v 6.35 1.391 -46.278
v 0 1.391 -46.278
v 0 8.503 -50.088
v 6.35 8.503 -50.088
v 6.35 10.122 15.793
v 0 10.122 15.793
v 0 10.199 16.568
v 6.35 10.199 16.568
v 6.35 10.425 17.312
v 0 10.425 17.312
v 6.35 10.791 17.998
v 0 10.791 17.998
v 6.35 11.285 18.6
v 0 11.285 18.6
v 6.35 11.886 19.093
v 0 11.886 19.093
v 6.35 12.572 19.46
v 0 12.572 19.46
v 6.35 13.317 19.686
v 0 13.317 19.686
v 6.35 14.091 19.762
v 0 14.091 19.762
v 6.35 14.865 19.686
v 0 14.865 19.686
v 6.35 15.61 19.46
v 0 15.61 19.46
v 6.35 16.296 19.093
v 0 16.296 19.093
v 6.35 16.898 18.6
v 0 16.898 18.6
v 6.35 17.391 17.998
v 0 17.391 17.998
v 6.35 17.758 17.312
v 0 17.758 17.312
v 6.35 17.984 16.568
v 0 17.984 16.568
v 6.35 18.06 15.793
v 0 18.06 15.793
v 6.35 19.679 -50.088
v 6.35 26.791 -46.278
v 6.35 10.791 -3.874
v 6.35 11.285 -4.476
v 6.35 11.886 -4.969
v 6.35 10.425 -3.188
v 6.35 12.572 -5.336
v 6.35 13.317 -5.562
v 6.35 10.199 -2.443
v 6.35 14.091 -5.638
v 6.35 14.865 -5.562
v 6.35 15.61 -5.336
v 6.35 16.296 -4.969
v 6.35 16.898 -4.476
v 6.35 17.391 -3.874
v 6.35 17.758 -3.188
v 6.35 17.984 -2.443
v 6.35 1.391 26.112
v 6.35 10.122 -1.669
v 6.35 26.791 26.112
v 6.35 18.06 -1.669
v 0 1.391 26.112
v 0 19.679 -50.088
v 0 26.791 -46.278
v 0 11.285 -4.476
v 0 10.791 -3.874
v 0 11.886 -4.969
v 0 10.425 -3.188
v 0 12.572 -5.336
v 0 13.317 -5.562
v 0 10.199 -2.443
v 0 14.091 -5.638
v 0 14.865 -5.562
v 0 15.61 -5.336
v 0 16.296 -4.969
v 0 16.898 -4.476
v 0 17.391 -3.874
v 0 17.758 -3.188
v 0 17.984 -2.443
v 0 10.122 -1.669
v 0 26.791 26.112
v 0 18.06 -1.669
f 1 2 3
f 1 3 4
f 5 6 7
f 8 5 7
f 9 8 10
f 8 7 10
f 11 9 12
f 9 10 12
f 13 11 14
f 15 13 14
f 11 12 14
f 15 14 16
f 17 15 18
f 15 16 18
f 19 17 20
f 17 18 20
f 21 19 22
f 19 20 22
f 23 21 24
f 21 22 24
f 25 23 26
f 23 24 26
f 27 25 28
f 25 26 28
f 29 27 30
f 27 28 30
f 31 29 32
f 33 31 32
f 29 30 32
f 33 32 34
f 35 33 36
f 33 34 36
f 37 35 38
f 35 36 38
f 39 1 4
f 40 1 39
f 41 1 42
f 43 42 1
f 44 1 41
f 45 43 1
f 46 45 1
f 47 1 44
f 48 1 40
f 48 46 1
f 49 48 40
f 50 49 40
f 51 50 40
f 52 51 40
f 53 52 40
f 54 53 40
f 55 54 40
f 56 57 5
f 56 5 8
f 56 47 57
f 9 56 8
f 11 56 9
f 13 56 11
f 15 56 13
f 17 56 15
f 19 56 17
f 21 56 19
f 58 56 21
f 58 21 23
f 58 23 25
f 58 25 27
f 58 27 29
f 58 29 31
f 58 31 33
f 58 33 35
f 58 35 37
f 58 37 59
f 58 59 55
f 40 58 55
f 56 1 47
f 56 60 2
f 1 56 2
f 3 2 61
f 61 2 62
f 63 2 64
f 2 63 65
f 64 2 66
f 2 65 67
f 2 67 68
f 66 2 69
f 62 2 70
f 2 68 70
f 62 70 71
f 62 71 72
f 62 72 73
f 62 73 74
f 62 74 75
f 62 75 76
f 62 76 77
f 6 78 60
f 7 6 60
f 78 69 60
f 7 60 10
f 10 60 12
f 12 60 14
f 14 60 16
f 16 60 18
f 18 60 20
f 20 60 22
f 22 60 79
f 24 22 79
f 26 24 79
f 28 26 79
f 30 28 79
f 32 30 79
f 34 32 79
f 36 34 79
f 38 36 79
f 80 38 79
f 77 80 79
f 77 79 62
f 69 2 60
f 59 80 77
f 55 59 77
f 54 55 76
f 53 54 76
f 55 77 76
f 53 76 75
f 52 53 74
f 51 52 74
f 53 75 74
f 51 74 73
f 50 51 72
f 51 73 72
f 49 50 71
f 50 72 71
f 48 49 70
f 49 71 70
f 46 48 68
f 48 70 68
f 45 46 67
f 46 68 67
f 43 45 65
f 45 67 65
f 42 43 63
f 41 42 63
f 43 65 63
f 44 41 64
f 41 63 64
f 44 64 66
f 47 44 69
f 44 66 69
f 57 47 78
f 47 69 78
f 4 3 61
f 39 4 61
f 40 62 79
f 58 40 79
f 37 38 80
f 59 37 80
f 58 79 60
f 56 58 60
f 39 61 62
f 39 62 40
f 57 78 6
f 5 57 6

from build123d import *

# Parameters (mm, degrees)
F1_DEPTH = 6.35
F2_SIZE2 = 3.81
F2_SIZE  = 7.112


with BuildPart() as f1:
    # F0 (on Right) → F1 (new body)
    with BuildSketch(Plane.YZ):
        Polygon((26.7912242562, 26.1120563269), (1.3912242562, 26.1120563269), (1.3912242562, -50.0879436731), (26.7912242562, -50.0879436731), (26.7912242562, 3.7854563269), (26.7912242562, 9.8814563269), align=None)
        with BuildLine():
            ThreePointArc((10.1224742562, 15.7933063269), (14.0912242562, 19.7620563269), (18.0599742562, 15.7933063269))
            Line((18.0599742562, 15.7933063269), (18.0599742562, -1.6691936731))
            ThreePointArc((18.0599742562, -1.6691936731), (14.0912242562, -5.6379436731), (10.1224742562, -1.6691936731))
            Line((10.1224742562, -1.6691936731), (10.1224742562, 15.7933063269))
        make_face(mode=Mode.SUBTRACT)
    extrude(amount=F1_DEPTH)

    # F2
    f2_edges = [f1.edges().sort_by_distance(p)[0] for p in [
        (3.175, 1.391224, -50.087944),
        (3.175, 26.791224, -50.087944),
    ]]
    f2_side = f1.faces().sort_by_distance((3.175, 14.091224, -50.087944))[0]
    chamfer(f2_edges, length=F2_SIZE, length2=F2_SIZE2, reference=f2_side)


solid = f1.part
